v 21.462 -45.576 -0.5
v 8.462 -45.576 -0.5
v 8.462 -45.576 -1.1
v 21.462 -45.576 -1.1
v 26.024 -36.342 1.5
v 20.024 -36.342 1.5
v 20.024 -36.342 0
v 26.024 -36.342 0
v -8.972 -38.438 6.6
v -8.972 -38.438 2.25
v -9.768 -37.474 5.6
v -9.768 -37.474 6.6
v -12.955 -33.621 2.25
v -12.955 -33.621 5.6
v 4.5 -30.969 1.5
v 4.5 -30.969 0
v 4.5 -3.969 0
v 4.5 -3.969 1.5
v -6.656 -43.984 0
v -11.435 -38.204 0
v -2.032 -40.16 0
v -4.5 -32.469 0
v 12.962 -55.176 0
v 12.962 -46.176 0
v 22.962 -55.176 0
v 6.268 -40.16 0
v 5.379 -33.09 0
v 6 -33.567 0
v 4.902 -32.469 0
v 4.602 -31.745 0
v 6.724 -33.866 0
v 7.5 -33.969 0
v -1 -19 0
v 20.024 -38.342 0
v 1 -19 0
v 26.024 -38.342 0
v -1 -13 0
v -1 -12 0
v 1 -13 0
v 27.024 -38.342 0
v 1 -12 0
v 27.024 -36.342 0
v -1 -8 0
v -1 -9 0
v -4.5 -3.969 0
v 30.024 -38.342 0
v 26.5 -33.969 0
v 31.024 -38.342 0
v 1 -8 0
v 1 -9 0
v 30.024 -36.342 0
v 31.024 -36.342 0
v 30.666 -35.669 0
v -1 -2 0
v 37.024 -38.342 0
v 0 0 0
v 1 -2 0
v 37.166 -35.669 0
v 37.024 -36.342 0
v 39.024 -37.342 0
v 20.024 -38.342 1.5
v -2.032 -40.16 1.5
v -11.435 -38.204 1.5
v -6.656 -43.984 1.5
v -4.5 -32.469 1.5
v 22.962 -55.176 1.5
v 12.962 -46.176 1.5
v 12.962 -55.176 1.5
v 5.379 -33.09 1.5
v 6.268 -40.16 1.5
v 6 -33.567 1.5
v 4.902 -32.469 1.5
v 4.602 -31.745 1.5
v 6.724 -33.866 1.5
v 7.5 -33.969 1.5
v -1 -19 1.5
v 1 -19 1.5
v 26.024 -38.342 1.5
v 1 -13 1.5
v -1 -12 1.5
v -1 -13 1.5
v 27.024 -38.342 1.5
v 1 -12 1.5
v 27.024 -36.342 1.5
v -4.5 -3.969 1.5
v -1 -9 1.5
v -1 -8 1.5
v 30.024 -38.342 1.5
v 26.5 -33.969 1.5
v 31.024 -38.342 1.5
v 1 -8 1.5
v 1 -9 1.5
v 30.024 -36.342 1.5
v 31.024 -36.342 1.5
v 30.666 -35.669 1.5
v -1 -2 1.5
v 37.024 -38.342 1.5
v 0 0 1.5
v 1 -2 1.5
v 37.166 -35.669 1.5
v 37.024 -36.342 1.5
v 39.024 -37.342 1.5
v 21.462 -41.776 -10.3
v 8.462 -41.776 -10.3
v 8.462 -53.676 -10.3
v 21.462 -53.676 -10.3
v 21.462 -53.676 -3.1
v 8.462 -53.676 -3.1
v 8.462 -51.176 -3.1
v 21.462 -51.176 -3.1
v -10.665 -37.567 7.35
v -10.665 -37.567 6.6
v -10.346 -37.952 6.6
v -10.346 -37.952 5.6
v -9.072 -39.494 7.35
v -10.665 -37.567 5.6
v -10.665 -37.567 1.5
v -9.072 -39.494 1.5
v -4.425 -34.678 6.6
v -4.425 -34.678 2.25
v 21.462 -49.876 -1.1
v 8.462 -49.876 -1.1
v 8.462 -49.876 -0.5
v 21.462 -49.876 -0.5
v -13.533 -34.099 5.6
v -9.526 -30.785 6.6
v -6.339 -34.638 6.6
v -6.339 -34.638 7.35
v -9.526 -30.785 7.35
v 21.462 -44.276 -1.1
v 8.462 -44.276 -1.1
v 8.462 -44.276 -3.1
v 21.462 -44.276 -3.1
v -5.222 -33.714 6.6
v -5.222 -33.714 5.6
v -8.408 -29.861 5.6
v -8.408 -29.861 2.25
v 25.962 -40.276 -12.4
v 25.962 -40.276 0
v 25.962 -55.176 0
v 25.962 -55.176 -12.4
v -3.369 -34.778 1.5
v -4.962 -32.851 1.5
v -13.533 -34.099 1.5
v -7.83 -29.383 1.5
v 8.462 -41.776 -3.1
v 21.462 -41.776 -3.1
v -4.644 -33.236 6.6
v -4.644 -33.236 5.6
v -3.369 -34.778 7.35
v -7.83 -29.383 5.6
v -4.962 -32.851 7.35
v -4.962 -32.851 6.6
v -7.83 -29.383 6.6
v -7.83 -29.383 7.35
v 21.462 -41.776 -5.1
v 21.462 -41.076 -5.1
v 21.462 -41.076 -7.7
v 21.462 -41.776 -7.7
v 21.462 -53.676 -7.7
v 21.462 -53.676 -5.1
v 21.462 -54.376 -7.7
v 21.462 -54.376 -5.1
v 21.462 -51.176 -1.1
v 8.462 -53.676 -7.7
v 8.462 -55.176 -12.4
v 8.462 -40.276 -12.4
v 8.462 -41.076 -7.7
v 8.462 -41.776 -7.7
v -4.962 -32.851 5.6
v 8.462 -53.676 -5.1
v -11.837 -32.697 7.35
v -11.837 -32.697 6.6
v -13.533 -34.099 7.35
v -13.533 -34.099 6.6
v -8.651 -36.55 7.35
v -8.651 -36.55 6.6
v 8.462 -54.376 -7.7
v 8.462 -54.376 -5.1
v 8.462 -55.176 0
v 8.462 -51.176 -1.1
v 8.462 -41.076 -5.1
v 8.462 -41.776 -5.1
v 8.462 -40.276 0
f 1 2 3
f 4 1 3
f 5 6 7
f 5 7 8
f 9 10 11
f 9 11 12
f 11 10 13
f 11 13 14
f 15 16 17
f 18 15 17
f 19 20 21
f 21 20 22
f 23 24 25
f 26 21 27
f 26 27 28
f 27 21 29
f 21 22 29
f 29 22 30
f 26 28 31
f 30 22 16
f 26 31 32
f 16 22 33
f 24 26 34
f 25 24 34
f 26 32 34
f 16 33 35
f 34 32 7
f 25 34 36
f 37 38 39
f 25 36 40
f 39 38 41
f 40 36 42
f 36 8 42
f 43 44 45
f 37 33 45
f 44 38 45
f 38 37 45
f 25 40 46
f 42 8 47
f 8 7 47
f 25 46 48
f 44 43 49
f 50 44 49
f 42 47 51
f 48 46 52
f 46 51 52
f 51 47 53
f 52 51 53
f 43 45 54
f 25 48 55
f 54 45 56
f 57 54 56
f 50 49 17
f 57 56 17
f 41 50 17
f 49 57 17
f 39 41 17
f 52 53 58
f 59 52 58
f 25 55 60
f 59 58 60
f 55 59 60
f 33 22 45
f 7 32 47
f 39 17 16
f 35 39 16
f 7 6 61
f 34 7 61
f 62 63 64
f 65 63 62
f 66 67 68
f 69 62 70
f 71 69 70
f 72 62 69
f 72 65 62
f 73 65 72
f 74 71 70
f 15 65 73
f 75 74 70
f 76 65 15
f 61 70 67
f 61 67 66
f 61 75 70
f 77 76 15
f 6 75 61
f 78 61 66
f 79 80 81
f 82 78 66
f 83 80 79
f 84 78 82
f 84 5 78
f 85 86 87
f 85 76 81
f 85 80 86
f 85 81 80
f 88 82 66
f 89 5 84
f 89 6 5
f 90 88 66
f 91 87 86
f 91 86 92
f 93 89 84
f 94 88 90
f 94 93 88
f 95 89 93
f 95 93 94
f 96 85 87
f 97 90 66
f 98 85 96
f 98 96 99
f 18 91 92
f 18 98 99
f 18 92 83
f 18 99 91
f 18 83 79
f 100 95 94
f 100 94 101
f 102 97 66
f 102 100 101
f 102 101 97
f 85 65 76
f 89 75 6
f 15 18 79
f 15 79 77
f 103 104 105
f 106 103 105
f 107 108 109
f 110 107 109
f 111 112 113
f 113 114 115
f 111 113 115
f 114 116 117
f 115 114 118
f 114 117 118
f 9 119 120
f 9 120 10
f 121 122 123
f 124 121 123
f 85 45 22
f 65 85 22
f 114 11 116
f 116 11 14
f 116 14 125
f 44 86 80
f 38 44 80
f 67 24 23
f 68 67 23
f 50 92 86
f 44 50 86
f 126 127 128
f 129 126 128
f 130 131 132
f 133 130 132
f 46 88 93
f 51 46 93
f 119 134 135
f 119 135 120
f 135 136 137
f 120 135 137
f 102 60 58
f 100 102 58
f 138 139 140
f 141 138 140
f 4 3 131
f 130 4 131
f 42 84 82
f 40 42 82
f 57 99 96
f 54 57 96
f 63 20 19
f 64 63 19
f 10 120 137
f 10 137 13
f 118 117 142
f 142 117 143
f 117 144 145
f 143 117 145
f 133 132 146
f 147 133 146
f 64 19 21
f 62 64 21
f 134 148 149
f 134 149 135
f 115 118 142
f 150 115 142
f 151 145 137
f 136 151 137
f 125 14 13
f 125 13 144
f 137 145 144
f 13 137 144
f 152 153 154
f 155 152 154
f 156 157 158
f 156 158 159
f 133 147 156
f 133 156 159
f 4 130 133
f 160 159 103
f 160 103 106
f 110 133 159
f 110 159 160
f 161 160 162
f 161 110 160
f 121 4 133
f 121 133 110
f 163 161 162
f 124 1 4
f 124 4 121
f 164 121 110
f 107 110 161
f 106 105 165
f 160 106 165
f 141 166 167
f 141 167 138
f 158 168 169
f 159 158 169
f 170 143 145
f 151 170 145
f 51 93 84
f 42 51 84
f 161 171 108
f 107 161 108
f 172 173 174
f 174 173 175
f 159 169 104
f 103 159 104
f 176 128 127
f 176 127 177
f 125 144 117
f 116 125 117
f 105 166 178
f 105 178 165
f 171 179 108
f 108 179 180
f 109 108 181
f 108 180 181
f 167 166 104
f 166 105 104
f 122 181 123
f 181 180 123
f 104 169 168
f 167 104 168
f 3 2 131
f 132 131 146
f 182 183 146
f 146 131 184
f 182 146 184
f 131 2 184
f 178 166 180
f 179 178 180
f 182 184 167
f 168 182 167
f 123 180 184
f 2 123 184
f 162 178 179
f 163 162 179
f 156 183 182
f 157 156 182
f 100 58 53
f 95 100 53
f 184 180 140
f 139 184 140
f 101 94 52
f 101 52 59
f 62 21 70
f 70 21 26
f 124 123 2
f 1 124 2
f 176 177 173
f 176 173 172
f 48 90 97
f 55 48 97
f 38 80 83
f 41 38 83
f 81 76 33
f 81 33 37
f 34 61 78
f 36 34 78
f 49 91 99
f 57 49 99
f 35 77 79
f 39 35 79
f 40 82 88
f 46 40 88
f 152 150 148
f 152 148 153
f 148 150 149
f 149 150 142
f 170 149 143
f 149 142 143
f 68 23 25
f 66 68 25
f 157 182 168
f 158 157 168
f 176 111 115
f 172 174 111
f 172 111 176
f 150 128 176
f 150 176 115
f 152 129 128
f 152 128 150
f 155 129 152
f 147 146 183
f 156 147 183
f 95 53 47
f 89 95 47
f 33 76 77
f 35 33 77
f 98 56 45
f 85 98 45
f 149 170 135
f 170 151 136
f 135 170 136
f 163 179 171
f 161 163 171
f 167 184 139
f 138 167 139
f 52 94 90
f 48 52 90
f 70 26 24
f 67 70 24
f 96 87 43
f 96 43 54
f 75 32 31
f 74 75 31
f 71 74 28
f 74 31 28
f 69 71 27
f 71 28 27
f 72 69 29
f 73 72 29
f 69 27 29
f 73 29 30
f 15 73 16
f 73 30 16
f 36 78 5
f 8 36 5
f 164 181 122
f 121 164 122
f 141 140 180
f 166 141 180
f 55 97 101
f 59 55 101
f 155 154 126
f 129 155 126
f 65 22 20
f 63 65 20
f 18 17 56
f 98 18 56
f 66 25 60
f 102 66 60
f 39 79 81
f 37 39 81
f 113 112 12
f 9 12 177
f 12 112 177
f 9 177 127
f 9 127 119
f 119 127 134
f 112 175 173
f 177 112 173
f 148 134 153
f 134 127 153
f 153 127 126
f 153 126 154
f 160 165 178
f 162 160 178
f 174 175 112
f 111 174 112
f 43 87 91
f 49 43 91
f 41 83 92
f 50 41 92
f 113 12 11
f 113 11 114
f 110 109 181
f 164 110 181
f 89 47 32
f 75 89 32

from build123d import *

# Parameters (mm, degrees)
F1_DEPTH  = 1.5
F2_W      = 1
F2_H      = 6
F2_W_2    = 6
F2_H_2    = 1
F3_DEPTH  = 1.501
F5_DEPTH  = 5.85
F6_W      = 2.95
F6_H      = 3.35
F7_DEPTH  = 6.25
F6_W_2    = 0.75
F6_H_2    = 1
F6_W_3    = 1.5
F6_H_3    = 0.75
F8_DEPTH  = 5
F10_DEPTH = 12.4
F12_DEPTH = 13


with BuildPart() as f1:
    # F0 (on Top) → F1 (new body)
    with BuildSketch(Plane.XY):
        with BuildLine():
            Line((4.5, -3.9686269666), (-4.5, -3.9686269666))
            Line((-4.5, -3.9686269666), (-4.5, -32.4686269666))
            Line((-4.5, -32.4686269666), (-11.4354022297, -38.2044962043))
            Line((-11.4354022297, -38.2044962043), (-6.6555111982, -43.9839980624))
            Line((-6.6555111982, -43.9839980624), (-2.0319097118, -40.1600852372))
            Line((-2.0319097118, -40.1600852372), (6.2680902882, -40.1600852372))
            Line((6.2680902882, -40.1600852372), (12.9623928621, -46.1755912882))
            Line((12.9623928621, -46.1755912882), (12.9623928621, -55.1755912882))
            Line((12.9623928621, -55.1755912882), (22.9623928621, -55.1755912882))
            Line((22.9623928621, -55.1755912882), (39.0239336918, -37.3422823923))
            Line((39.0239336918, -37.3422823923), (37.1662973484, -35.6692052225))
            Line((37.1662973484, -35.6692052225), (30.6662973484, -35.6692052225))
            Line((30.6662973484, -35.6692052225), (26.5, -33.9686269666))
            Line((26.5, -33.9686269666), (7.5, -33.9686269666))
            ThreePointArc((7.5, -33.9686269666), (5.3786796564, -33.0899473102), (4.5, -30.9686269666))
            Line((4.5, -30.9686269666), (4.5, -3.9686269666))
        make_face()
        Polygon((4.5, -3.9686269666), (0, 0), (-4.5, -3.9686269666), align=None)
    extrude(amount=F1_DEPTH)

    # F2 (on face) → F3 (cut, through all)
    with BuildSketch(Plane.XY.offset(1.5)):
        with Locations((-0.5, -5)):
            Rectangle(F2_W, F2_H)
        with Locations((0.5, -5)):
            Rectangle(F2_W, F2_H)
        Polygon((0, -12), (0, -10.5), (-1, -9), (-1, -12), align=None)
        Polygon((1, -9), (0, -9), (0, -10.5), (1, -12), align=None)
        with Locations((-0.5, -16)):
            Rectangle(F2_W, F2_H)
        with Locations((0.5, -16)):
            Rectangle(F2_W, F2_H)
        with Locations((23.0239336918, -36.8422823923)):
            Rectangle(F2_W_2, F2_H_2)
        with Locations((23.0239336918, -37.8422823923)):
            Rectangle(F2_W_2, F2_H_2)
        Polygon((30.0239336918, -38.3422823923), (28.5239336918, -37.3422823923), (27.0239336918, -37.3422823923), (27.0239336918, -38.3422823923), align=None)
        with Locations((34.0239336918, -36.8422823923)):
            Rectangle(F2_W_2, F2_H_2)
        with Locations((34.0239336918, -37.8422823923)):
            Rectangle(F2_W_2, F2_H_2)
        Polygon((0, -10.5), (0, -9), (-1, -9), align=None)
        Polygon((1, -12), (0, -10.5), (0, -12), align=None)
        Polygon((27.0239336918, -37.3422823923), (28.5239336918, -37.3422823923), (27.0239336918, -36.3422823923), align=None)
        Polygon((28.5239336918, -37.3422823923), (30.0239336918, -37.3422823923), (30.0239336918, -36.3422823923), (27.0239336918, -36.3422823923), align=None)
        Polygon((30.0239336918, -38.3422823923), (30.0239336918, -37.3422823923), (28.5239336918, -37.3422823923), align=None)
    extrude(amount=-F3_DEPTH, mode=Mode.SUBTRACT)


with BuildPart() as f5:
    # F4 (on face) → F5 (new body)
    with BuildSketch(Plane.XY.offset(1.5)):
        Polygon((-7.8302947675, -29.3833171343), (-13.5327366008, -34.0994762853), (-10.6648019819, -37.5671774001), (-4.9623601486, -32.8510182491), align=None)
        Polygon((-4.9623601486, -32.8510182491), (-10.6648019819, -37.5671774001), (-9.0715049715, -39.4936780195), (-3.3690631382, -34.7775188685), align=None)
    extrude(amount=F5_DEPTH)

    # F6 (on face) → F7 (cut)
    with BuildSketch(Plane(origin=(11.2502047801, -13.6029417831, 0), x_dir=(-0.7706002477, -0.6373188042, 0), z_dir=(-0.6373188042, 0.7706002477, 0))):
        with Locations((29.935567627, 3.925)):
            Rectangle(F6_W, F6_H)
        Polygon((28.460567627, 5.6), (31.410567627, 5.6), (31.410567627, 6.6), (29.960567627, 6.6), (28.460567627, 6.6), align=None)
        with Locations((26.985567627, 3.925)):
            Rectangle(F6_W, F6_H)
        Polygon((25.510567627, 5.6), (28.460567627, 5.6), (28.460567627, 6.6), (26.960567627, 6.6), (25.510567627, 6.6), align=None)
    extrude(amount=-F7_DEPTH, mode=Mode.SUBTRACT)

    # F6 (on face) → F8 (cut)
    with BuildSketch(Plane(origin=(11.2502047801, -13.6029417831, 0), x_dir=(-0.7706002477, -0.6373188042, 0), z_dir=(-0.6373188042, 0.7706002477, 0))):
        with Locations((31.785567627, 6.1)):
            Rectangle(F6_W_2, F6_H_2)
        with Locations((29.210567627, 6.975)):
            Rectangle(F6_W_3, F6_H_3)
        with Locations((27.710567627, 6.975)):
            Rectangle(F6_W_3, F6_H_3)
        with Locations((25.135567627, 6.1)):
            Rectangle(F6_W_2, F6_H_2)
    extrude(amount=-F8_DEPTH, mode=Mode.SUBTRACT)


with BuildPart() as f10:
    # F9 (on face) → F10 (new body)
    with BuildSketch(Plane(origin=(0, 0, 0), x_dir=(1, 0, 0), z_dir=(0, 0, -1))):
        Polygon((12.9623928621, 46.1755912882), (12.9623928621, 55.1755912882), (8.4623928621, 55.1755912882), (8.4623928621, 42.1318874176), align=None)
        Polygon((25.9623928621, 51.8446576465), (22.9623928621, 55.1755912882), (12.9623928621, 55.1755912882), (12.9623928621, 46.1755912882), (8.4623928621, 42.1318874176), (8.4623928621, 40.2755912882), (25.9623928621, 40.2755912882), align=None)
        Polygon((25.9623928621, 51.8446576465), (25.9623928621, 55.1755912882), (22.9623928621, 55.1755912882), align=None)
    extrude(amount=F10_DEPTH)

    # F11 (on face) → F12 (cut)
    with BuildSketch(Plane(origin=(8.4623928621, 0, 0), x_dir=(0, -1, 0), z_dir=(-1, 0, 0))):
        Polygon((47.7255912882, -0.5), (47.7255912882, -10.3), (53.6755912882, -10.3), (53.6755912882, -7.7), (54.3755912882, -7.7), (54.3755912882, -5.1), (53.6755912882, -5.1), (53.6755912882, -3.1), (51.1755912882, -3.1), (51.1755912882, -1.1), (49.8755912882, -1.1), (49.8755912882, -0.5), align=None)
        Polygon((41.7755912882, -10.3), (47.7255912882, -10.3), (47.7255912882, -0.5), (45.5755912882, -0.5), (45.5755912882, -1.1), (44.2755912882, -1.1), (44.2755912882, -3.1), (41.7755912882, -3.1), (41.7755912882, -5.1), (41.0755912882, -5.1), (41.0755912882, -7.7), (41.7755912882, -7.7), align=None)
    extrude(amount=-F12_DEPTH, mode=Mode.SUBTRACT)


solid = Compound([f1.part, f5.part, f10.part])
